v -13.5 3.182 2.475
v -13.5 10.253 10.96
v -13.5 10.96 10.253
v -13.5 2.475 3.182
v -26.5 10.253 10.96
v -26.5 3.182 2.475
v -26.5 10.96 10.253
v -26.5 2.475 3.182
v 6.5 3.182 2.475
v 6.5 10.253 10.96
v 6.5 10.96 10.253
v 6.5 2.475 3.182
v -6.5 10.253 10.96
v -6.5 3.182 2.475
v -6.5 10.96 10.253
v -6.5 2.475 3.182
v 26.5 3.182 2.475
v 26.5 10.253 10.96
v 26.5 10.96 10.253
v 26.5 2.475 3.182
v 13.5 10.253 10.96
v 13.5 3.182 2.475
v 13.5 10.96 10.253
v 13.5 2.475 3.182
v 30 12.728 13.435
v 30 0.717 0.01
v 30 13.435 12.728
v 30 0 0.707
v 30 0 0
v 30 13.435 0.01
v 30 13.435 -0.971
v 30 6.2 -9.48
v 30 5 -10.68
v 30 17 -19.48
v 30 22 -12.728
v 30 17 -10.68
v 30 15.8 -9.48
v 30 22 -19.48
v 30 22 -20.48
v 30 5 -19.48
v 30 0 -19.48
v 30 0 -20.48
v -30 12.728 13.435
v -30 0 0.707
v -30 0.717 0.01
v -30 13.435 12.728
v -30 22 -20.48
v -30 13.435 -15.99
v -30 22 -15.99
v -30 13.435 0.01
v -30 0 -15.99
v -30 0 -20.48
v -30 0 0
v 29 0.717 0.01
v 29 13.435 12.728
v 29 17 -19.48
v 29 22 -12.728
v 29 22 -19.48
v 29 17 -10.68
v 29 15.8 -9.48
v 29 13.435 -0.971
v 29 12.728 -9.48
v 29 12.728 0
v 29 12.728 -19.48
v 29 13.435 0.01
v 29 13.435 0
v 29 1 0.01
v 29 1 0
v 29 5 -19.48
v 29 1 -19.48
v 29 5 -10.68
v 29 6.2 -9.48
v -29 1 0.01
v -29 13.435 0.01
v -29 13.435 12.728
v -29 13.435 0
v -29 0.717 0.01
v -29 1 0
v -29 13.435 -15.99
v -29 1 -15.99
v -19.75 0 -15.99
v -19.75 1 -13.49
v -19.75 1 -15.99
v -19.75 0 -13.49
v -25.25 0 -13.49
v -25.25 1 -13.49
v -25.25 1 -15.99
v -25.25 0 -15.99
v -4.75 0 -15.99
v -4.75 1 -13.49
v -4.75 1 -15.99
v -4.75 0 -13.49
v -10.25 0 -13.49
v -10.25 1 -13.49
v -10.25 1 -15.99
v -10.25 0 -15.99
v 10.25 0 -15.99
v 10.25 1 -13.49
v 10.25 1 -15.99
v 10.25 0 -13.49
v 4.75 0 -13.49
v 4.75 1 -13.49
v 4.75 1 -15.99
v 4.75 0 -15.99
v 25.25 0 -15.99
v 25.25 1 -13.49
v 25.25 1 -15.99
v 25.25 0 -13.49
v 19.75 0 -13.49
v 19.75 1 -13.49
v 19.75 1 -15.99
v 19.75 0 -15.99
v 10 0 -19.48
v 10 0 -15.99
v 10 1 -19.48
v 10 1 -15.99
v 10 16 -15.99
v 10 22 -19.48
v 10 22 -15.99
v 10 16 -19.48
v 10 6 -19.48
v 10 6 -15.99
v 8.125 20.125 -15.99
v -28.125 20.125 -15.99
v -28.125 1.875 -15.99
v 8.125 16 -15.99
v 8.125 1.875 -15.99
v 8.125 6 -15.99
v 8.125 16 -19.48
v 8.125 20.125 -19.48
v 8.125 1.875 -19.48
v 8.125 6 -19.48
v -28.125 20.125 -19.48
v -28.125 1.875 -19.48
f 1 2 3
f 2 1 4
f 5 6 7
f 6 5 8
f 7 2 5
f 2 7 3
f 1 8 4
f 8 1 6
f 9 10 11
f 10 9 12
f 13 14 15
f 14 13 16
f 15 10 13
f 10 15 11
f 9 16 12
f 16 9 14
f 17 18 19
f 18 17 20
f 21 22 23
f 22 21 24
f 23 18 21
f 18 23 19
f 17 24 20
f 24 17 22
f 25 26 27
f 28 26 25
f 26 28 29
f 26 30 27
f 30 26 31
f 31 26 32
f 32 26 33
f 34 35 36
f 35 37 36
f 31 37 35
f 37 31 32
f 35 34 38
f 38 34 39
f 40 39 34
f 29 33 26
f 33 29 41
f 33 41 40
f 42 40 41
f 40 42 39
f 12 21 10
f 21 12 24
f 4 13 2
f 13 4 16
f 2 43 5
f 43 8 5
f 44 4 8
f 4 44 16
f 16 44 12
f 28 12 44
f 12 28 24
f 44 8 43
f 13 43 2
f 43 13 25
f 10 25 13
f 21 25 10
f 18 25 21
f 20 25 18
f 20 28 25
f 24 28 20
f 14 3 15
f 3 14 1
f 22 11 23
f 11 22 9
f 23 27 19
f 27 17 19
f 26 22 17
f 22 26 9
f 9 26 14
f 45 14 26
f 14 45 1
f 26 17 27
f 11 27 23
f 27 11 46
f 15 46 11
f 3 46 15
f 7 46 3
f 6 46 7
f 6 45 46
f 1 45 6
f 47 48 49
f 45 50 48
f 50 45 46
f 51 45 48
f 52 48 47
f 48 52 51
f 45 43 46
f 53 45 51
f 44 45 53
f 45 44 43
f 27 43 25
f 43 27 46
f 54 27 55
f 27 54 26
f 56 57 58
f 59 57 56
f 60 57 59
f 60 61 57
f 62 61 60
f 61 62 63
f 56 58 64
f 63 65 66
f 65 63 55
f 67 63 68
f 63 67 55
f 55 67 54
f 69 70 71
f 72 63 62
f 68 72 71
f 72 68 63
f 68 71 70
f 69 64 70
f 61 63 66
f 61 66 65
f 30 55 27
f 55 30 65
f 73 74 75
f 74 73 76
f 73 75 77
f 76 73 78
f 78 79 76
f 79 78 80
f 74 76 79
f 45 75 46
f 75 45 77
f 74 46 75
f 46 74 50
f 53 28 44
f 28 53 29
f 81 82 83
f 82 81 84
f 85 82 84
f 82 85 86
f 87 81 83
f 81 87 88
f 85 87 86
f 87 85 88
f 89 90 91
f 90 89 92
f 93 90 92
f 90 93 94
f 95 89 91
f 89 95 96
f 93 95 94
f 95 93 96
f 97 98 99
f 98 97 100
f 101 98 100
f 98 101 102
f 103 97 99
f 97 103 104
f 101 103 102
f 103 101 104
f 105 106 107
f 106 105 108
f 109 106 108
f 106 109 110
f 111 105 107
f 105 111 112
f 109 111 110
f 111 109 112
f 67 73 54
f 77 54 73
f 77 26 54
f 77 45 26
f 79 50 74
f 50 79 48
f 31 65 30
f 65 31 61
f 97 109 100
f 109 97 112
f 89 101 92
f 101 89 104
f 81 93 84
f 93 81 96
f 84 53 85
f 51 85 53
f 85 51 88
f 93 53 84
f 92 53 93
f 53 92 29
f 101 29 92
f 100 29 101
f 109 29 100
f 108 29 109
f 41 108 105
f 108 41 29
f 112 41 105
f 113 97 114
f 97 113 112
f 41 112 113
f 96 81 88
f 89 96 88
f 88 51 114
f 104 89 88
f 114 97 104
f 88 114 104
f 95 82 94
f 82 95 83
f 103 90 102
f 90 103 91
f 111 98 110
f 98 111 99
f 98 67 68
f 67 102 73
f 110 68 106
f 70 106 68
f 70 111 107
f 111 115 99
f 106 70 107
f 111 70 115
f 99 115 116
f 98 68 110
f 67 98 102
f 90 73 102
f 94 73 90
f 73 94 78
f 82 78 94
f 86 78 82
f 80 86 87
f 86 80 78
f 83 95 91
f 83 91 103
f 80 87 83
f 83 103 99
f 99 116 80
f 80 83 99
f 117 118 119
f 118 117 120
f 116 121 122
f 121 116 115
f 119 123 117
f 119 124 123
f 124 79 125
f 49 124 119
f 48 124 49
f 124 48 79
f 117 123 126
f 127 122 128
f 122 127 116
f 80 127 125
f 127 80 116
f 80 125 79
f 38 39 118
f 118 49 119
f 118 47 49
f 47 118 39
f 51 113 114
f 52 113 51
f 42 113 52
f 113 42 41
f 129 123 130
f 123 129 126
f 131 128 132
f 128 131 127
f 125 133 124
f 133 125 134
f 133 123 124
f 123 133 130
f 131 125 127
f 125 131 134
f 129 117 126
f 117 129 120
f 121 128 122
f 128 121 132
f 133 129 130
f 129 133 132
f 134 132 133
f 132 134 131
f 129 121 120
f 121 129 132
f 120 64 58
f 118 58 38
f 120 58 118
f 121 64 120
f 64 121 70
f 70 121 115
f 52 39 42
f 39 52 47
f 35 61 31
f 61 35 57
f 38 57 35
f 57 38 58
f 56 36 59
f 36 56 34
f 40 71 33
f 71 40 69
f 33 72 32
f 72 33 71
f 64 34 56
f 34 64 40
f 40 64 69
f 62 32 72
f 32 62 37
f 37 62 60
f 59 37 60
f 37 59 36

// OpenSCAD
btn_w = 13;
btn_h = 11;
btn_pad = 7;
btn_end_pad = btn_pad/2;
btn_count = 3;

teensy = [36, 18, 4];
teensy_wall = 2;
teensy_outer = teensy + [teensy_wall*2, teensy_wall*2, 0];

panel_w = (btn_w * btn_count) + (btn_pad * (btn_count-1)) + btn_end_pad*2;
panel_d = btn_h + btn_pad;
wall = 1;

base_h = 17+3;

zip = [5.5, 0, 2.5];

usb = [wall*3, 12, 10];
usb_leg = 1.2;  // triangle leg of top bevel

need_usb_if_panel_w_lt = 80;

ff = 0.01;
slop = 0.25;

/**** computed variables **/

// gap after rotating panel 45deg
panel_btm_gap = wall / sqrt(2);
panel_side_leg = panel_d / sqrt(2);

panel_y = panel_btm_gap + panel_side_leg;

echo(panel_w=panel_w, panel_d=panel_d, teensy_outer_y=teensy_outer.y);

/*!*!*!*!*!*!*!*!*!*!*\
|      Assembly       |
\*!*!*!*!*!*!*!*!*!*!*/
difference() {
  union() {
    panel();
    base();

    // USB brace
    if(panel_w < need_usb_if_panel_w_lt)
      translate([panel_w/2 - wall, panel_side_leg, -base_h])
      rotate(90, [0, 0, 1])
      rotate(90, [1, 0, 0])
      linear_extrude(wall)
      polygon([
        [0, 0],
        [0, base_h],
        [teensy_outer.y-panel_side_leg, base_h-panel_side_leg],
        [teensy_outer.y-panel_side_leg, 0]
      ]);
  }

  // USB hole
  if(panel_w < need_usb_if_panel_w_lt)
    translate([panel_w/2, teensy_outer.y/2, -base_h + wall/2 + ff*2])
    // center xy on origin, btm on z(0)
    translate([usb.x/-2, usb.y/-2, 0])
    rotate(90, [0, 0, 1])
    rotate(90, [1, 0, 0])
    linear_extrude(usb.x)
    polygon([
      [0, 0], [0, usb.z - usb_leg], [usb_leg, usb.z],
      [usb.y - usb_leg, usb.z], [usb.y, usb.z - usb_leg],
      [usb.y, 0]
    ]);

}


module base() {
  translate([0, panel_y/2, (base_h/-2)+ff])  {
    // 3 vertical walls
    difference() {
      base_v = [panel_w, panel_y, base_h];
      cube(base_v, center=true);

      translate([0, wall, 0])
        cube(base_v - [wall*2, 0, -base_h], center=true);

      // zip tie holes
      tie_count = 4;
      tie_pad = (base_v.x - (zip.x * tie_count)) / tie_count;
      tie_reset = base_v.x/-2 + zip.x/2;
      for (i = [0:tie_count-1])
        translate([
          tie_reset + tie_pad/2 + ((tie_pad + zip.x) * i),
          base_v.y/-2,
          base_v.z/-2 + zip.z/2 + teensy_outer.z
        ])
          cube(zip + [0, base_v.y, 0], center=true);
    }

    translate([0, teensy_outer.y/2 - panel_y/2, ff + base_h/-2]) {
      // floor
      cube([panel_w, teensy_outer.y, wall], center=true);

      // teensy mount
      translate([(panel_w - teensy_outer.x)/-2, 0, teensy_outer.z/2 - ff])
      difference() {
        // outer box
        cube(teensy_outer, center=true);
        // box cutout
        cube(teensy + [slop, slop, 10], center=true);
        // usb cutout
        translate([teensy.x/2, 0, 0])
          cube([teensy.x, 10, 10], center=true);
      }
    }
  }
}

module panel() {
  translate([0, panel_btm_gap, 0])
  union() {
    rotate(45, [1, 0, 0])
      translate([panel_w/-2, panel_d/2, 0])
      difference() {
        translate([0, panel_d/-2, 0])
          cube([panel_w, panel_d, wall]);

        // button cutouts
        for (i = [0:btn_count-1]) {
          x = (btn_w + btn_pad) * i;
          translate([x + btn_end_pad,  btn_h/-2, -wall])
            cube([btn_w, btn_h, wall*3]);
        }
      }
    // fill gap at bottom of panel
    translate([panel_w/-2, -panel_btm_gap, 0])
      cube([panel_w, panel_btm_gap, panel_btm_gap]);

    // triangle sides
    for (i = [1, -1])
    translate([(panel_w/2 + wall/-2)*i, 0, 0])
      translate([wall/2, panel_side_leg, 0])
      rotate(-90, [0, 1, 0])
      linear_extrude(wall)
        polygon([[0,0], [0, -panel_side_leg], [panel_side_leg, 0]]);
  }
}
